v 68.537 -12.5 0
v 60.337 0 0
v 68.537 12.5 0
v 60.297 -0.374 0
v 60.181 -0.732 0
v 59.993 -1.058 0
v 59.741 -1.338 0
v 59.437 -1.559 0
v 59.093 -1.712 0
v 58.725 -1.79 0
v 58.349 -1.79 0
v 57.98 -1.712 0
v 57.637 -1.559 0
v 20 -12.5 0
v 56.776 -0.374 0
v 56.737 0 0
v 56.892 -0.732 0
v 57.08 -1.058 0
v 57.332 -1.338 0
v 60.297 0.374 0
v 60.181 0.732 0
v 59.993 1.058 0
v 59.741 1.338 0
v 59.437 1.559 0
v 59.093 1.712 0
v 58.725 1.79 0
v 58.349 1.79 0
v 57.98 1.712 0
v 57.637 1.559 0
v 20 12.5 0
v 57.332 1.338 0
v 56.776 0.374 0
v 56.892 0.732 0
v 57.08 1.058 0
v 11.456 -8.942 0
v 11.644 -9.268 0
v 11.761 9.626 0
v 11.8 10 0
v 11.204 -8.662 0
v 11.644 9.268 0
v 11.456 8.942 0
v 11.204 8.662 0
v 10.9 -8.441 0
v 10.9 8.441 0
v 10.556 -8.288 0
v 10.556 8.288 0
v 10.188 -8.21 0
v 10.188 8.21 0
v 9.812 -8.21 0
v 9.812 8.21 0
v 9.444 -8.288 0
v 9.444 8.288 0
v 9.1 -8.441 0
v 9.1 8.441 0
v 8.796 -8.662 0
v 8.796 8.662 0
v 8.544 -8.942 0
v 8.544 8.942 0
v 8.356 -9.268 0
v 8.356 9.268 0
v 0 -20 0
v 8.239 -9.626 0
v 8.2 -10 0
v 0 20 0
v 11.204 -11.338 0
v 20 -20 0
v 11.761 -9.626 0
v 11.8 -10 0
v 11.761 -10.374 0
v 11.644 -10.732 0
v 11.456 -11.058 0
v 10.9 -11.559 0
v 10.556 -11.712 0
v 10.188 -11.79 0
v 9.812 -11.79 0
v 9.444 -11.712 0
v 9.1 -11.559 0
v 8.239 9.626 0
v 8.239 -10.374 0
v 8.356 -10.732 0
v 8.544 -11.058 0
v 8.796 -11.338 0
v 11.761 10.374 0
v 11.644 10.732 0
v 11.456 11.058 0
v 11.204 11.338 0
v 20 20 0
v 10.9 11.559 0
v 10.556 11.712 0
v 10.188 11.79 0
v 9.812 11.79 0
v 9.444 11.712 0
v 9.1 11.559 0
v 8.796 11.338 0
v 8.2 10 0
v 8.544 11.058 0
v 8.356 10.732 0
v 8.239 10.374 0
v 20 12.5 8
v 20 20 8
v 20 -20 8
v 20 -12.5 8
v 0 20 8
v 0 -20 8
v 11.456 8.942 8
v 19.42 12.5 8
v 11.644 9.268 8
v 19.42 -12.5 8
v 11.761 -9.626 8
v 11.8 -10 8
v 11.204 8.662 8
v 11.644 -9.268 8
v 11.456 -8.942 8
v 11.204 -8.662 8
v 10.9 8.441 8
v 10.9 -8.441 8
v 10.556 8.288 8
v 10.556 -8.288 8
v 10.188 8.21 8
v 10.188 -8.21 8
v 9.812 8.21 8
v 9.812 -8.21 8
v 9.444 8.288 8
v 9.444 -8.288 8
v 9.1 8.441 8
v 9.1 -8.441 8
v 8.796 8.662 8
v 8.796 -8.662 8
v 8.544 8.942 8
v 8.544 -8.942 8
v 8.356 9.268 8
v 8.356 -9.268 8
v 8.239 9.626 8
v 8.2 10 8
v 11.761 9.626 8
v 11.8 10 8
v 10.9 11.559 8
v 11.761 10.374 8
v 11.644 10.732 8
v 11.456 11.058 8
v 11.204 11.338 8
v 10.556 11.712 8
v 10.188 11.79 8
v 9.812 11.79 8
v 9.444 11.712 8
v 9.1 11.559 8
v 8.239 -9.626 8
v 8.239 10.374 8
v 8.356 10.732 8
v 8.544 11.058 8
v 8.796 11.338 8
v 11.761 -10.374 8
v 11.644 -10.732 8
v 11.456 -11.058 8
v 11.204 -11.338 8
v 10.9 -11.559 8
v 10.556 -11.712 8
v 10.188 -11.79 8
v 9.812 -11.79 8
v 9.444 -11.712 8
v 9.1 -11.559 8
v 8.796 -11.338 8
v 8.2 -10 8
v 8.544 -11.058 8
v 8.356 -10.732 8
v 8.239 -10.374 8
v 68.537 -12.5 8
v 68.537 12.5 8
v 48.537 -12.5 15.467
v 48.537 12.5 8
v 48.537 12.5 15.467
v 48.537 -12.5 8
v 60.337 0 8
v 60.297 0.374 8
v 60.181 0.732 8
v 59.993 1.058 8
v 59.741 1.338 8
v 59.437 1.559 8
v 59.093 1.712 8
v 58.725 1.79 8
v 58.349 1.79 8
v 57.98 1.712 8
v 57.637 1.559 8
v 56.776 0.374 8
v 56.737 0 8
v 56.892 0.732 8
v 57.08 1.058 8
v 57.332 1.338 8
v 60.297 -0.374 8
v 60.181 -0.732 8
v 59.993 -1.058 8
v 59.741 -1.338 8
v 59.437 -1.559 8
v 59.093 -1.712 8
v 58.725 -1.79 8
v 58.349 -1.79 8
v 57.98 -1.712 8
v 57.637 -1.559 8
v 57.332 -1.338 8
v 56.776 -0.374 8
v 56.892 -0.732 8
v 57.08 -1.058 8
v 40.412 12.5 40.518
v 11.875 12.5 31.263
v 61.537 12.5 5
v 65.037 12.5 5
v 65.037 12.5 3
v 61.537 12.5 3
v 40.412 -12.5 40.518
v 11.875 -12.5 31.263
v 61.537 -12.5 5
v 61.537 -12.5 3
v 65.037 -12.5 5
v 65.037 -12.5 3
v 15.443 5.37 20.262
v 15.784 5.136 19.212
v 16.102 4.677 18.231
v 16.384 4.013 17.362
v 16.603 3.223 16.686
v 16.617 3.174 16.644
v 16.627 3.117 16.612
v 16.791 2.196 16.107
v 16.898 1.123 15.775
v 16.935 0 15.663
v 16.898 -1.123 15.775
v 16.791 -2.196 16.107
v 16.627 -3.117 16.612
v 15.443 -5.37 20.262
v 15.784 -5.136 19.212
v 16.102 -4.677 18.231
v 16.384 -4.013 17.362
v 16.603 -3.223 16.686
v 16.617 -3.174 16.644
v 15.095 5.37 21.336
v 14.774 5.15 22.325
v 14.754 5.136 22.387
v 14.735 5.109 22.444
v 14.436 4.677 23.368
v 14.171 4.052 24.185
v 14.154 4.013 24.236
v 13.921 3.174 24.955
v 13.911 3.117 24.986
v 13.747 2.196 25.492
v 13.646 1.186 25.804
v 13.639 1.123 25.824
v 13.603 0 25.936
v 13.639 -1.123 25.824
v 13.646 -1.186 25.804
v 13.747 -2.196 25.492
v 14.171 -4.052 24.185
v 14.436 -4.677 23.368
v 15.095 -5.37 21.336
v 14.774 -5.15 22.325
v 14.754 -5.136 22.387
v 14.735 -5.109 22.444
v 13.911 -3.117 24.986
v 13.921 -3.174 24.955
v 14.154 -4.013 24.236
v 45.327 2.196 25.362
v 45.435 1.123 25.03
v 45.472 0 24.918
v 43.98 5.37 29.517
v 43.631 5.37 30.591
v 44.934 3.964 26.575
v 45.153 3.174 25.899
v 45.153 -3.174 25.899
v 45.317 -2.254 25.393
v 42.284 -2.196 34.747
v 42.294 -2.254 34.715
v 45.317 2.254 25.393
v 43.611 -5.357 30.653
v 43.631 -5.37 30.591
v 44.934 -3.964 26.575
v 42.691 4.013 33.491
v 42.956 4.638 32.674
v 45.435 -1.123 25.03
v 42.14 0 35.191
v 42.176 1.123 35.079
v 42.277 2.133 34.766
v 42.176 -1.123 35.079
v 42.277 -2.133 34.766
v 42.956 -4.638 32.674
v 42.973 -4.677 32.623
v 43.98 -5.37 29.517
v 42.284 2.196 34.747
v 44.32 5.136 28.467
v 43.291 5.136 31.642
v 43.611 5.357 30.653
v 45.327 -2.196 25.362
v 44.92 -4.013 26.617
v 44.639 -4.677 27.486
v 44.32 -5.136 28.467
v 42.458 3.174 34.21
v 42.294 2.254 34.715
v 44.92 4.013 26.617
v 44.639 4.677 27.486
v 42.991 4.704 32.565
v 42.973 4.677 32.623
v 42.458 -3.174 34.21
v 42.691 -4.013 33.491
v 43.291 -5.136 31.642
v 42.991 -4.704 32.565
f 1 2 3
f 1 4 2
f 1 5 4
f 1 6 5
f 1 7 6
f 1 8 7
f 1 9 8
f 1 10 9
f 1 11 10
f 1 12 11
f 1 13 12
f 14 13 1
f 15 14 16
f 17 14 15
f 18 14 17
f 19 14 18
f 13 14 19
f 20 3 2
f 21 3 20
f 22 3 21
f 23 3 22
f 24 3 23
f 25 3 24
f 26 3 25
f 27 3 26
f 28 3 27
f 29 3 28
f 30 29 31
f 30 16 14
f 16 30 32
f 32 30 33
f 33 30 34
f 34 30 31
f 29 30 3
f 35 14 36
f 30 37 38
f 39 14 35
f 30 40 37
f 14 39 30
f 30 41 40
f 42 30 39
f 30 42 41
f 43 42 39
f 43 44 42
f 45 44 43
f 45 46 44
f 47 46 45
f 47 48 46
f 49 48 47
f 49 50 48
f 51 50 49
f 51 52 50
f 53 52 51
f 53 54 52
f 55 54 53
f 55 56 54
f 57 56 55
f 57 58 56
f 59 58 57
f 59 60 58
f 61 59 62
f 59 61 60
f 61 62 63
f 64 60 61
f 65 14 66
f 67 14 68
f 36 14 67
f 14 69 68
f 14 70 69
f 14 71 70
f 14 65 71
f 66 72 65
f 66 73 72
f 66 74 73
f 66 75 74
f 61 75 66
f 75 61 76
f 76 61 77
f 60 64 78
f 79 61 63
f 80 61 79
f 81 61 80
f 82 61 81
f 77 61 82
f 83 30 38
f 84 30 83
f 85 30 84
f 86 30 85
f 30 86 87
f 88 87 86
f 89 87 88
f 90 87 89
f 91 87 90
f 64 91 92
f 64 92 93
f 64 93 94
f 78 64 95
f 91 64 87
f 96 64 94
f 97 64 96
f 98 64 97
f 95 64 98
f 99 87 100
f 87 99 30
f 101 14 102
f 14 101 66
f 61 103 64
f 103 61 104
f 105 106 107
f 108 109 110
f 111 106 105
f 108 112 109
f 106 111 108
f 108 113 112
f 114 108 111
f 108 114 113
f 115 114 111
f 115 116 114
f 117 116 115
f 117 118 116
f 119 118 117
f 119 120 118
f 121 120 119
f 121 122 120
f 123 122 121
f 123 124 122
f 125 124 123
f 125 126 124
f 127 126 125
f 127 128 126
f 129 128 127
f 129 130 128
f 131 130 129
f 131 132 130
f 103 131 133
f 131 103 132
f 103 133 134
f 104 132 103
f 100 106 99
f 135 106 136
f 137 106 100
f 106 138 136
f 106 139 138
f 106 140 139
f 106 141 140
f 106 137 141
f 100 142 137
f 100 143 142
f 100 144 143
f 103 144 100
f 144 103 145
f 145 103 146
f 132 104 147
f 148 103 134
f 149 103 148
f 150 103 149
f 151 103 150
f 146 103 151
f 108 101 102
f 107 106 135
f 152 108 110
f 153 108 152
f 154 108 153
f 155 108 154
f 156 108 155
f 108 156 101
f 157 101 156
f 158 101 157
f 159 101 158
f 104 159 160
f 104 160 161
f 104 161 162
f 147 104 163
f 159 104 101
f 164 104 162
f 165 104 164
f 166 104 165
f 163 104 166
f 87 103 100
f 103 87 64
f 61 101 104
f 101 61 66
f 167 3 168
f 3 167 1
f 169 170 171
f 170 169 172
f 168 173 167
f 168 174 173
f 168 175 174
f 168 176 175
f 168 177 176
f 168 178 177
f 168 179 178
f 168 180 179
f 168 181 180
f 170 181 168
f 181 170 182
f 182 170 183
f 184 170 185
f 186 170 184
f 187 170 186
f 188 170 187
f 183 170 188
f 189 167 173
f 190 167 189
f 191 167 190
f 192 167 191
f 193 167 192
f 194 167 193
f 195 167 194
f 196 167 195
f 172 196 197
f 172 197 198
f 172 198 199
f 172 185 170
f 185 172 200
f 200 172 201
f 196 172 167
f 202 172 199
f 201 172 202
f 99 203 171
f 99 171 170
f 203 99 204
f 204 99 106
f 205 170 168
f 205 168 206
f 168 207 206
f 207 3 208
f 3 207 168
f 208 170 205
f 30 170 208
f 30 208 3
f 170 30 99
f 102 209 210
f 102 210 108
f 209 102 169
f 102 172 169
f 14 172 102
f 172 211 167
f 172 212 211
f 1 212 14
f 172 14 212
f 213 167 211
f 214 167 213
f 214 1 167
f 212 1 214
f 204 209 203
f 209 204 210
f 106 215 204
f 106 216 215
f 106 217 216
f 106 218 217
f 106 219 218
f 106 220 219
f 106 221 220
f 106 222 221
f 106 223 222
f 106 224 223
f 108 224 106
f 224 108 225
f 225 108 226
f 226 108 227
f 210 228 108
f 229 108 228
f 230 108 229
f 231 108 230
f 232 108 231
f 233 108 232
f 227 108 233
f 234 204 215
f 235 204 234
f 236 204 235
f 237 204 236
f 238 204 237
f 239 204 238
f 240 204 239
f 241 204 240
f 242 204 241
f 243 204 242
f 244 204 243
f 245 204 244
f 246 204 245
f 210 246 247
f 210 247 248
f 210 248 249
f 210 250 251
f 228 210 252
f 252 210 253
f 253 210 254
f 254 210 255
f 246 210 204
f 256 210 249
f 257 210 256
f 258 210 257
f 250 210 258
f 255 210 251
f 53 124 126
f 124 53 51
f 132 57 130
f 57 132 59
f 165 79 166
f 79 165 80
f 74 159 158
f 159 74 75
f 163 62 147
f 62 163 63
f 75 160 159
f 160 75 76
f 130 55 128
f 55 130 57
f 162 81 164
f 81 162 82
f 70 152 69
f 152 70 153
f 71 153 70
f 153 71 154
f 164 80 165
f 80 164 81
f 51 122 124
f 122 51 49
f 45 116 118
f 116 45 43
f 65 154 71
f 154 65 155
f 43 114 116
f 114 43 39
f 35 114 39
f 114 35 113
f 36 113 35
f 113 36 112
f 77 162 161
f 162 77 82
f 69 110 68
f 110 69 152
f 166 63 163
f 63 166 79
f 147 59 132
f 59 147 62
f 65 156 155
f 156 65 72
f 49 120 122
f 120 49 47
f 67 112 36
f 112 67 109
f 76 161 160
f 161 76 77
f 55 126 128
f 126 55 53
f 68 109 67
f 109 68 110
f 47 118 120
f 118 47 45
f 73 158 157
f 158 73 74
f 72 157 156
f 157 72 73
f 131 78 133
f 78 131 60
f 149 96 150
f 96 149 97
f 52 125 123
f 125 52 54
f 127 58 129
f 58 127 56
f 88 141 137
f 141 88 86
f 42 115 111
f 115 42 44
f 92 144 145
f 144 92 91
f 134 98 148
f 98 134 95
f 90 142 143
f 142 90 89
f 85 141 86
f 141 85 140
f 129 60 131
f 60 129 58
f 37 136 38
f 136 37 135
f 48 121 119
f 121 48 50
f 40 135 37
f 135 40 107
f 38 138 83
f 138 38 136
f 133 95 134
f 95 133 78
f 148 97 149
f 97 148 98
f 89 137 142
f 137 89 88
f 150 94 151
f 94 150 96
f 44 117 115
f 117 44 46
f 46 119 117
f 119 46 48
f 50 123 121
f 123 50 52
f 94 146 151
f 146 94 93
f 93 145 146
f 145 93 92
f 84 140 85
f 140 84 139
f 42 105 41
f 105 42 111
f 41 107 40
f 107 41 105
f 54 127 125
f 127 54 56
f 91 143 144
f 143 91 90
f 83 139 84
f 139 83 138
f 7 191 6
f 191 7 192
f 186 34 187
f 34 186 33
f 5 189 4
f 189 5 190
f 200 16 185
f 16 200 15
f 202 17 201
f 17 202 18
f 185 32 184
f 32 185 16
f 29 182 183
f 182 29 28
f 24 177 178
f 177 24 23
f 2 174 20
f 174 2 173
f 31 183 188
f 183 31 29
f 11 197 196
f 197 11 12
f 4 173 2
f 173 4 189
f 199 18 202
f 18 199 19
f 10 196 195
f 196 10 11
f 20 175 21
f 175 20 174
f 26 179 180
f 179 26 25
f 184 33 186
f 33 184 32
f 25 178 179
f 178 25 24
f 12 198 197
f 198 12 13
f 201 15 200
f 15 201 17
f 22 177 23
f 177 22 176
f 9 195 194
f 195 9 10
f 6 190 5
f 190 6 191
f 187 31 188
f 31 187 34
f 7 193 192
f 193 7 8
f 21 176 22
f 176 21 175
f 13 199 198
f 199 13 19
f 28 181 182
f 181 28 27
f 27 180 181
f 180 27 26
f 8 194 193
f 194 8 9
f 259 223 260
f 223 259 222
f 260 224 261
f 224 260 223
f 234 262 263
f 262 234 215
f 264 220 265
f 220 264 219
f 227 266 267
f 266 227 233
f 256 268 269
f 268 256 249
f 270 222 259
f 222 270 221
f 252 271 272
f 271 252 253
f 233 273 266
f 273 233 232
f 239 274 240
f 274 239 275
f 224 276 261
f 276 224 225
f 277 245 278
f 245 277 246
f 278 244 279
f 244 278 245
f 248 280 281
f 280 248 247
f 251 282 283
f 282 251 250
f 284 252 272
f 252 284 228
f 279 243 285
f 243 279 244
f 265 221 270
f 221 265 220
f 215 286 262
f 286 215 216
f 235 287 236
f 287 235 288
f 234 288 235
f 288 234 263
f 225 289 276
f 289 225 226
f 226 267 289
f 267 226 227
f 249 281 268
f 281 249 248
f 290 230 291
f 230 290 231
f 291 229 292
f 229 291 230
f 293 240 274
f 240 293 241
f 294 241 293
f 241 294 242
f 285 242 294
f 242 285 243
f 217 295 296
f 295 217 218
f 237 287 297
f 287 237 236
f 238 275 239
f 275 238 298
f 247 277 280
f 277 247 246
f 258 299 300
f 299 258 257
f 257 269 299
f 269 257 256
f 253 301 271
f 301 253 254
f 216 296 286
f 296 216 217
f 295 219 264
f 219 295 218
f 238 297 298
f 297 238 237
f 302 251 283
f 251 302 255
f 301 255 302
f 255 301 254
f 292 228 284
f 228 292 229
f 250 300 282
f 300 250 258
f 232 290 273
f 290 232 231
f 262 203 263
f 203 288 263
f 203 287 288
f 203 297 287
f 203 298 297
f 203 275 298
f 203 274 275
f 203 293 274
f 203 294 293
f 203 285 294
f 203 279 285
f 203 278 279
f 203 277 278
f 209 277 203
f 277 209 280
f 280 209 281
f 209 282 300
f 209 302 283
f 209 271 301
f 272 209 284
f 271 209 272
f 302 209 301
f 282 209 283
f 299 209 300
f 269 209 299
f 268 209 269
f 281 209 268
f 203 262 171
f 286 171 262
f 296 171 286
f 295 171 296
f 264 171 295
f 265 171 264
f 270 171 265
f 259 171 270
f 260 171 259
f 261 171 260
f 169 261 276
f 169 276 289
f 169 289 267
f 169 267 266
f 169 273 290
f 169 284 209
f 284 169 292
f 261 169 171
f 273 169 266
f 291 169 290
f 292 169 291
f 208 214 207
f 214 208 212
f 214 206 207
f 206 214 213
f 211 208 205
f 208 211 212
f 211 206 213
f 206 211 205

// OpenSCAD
angle = atan(370/120)-90; 

// mounting bracket
width = 40;
height = 20;
depth = 8;
hole_distance = 20;
r_hole = 1.8;
hole_posx = (width - hole_distance) / 2 - width / 2;
hole_posz = height / 2;


// brace
width2 = 25;
depth2 = 25;
height2 = 30;
r_hole2 = 5.4;

brace_hole_posx = -20;
brace_hole_posz = 30;
brace_hole_offset = -1.5;


// mounting bracket 2
hole_posz2 = height + height2*cos(angle) + height / 2;


// zip tie
ziptie_height = 2.0;
ziptie_width = 3.5;
hole_posz3 = 3 + height + height2*cos(angle) + height / 2;


eps = 2.0;


module z_top_base(){
	// bracket
	translate([-depth/2,-width/2,0]) cube([depth,width,height]);
	translate([-depth/2,-width2/2,height+height2*cos(angle)]) cube([depth,width2,height]);
	// brace
	translate([brace_hole_posx,0,brace_hole_posz]) rotate([0,angle,0]) translate([-depth2/2,-width2/2,-height2/2]) cube([depth2,width2,height2]);
	translate([-depth2+depth/2,-width2/2,height]) cube([depth2,width2,height2*cos(angle)]);
}


module z_top_holes(){
	// Screw holes
	translate([-eps-depth/2,hole_posx,hole_posz]) rotate([0,90,0]) cylinder(h=depth+2*eps, r=r_hole, $fn=30);
	translate([-eps-depth/2,hole_posx+hole_distance,hole_posz]) rotate([0,90,0]) cylinder(h=depth+2*eps, r=r_hole, $fn=30);
	translate([-eps-depth/2,0,hole_posz2]) rotate([0,90,0]) cylinder(h=depth+2*eps, r=r_hole, $fn=30);
	// brace
	translate([brace_hole_posx,0,brace_hole_posz]) rotate([0,angle,0]) translate([brace_hole_offset,0,-height2/2-eps]) cylinder(h = height2+2*eps, r=r_hole2, $fn=30);
	translate([brace_hole_posx,0,brace_hole_posz]) rotate([0,angle,0]) translate([-depth2/2-eps,-width2/2-eps,height2/2]) cube([depth2+2*eps,width2+2*eps,height2]);

	// Ziptie
	translate([-ziptie_height/2,-width2/2-eps, hole_posz3]) cube([ziptie_height,width2+2*eps,ziptie_width]);
}




// Final part
module z_top(){
	translate([0,0,depth/2]) rotate([0,90,0]) difference(){
		z_top_base();
		z_top_holes();
	}
}


z_top();
